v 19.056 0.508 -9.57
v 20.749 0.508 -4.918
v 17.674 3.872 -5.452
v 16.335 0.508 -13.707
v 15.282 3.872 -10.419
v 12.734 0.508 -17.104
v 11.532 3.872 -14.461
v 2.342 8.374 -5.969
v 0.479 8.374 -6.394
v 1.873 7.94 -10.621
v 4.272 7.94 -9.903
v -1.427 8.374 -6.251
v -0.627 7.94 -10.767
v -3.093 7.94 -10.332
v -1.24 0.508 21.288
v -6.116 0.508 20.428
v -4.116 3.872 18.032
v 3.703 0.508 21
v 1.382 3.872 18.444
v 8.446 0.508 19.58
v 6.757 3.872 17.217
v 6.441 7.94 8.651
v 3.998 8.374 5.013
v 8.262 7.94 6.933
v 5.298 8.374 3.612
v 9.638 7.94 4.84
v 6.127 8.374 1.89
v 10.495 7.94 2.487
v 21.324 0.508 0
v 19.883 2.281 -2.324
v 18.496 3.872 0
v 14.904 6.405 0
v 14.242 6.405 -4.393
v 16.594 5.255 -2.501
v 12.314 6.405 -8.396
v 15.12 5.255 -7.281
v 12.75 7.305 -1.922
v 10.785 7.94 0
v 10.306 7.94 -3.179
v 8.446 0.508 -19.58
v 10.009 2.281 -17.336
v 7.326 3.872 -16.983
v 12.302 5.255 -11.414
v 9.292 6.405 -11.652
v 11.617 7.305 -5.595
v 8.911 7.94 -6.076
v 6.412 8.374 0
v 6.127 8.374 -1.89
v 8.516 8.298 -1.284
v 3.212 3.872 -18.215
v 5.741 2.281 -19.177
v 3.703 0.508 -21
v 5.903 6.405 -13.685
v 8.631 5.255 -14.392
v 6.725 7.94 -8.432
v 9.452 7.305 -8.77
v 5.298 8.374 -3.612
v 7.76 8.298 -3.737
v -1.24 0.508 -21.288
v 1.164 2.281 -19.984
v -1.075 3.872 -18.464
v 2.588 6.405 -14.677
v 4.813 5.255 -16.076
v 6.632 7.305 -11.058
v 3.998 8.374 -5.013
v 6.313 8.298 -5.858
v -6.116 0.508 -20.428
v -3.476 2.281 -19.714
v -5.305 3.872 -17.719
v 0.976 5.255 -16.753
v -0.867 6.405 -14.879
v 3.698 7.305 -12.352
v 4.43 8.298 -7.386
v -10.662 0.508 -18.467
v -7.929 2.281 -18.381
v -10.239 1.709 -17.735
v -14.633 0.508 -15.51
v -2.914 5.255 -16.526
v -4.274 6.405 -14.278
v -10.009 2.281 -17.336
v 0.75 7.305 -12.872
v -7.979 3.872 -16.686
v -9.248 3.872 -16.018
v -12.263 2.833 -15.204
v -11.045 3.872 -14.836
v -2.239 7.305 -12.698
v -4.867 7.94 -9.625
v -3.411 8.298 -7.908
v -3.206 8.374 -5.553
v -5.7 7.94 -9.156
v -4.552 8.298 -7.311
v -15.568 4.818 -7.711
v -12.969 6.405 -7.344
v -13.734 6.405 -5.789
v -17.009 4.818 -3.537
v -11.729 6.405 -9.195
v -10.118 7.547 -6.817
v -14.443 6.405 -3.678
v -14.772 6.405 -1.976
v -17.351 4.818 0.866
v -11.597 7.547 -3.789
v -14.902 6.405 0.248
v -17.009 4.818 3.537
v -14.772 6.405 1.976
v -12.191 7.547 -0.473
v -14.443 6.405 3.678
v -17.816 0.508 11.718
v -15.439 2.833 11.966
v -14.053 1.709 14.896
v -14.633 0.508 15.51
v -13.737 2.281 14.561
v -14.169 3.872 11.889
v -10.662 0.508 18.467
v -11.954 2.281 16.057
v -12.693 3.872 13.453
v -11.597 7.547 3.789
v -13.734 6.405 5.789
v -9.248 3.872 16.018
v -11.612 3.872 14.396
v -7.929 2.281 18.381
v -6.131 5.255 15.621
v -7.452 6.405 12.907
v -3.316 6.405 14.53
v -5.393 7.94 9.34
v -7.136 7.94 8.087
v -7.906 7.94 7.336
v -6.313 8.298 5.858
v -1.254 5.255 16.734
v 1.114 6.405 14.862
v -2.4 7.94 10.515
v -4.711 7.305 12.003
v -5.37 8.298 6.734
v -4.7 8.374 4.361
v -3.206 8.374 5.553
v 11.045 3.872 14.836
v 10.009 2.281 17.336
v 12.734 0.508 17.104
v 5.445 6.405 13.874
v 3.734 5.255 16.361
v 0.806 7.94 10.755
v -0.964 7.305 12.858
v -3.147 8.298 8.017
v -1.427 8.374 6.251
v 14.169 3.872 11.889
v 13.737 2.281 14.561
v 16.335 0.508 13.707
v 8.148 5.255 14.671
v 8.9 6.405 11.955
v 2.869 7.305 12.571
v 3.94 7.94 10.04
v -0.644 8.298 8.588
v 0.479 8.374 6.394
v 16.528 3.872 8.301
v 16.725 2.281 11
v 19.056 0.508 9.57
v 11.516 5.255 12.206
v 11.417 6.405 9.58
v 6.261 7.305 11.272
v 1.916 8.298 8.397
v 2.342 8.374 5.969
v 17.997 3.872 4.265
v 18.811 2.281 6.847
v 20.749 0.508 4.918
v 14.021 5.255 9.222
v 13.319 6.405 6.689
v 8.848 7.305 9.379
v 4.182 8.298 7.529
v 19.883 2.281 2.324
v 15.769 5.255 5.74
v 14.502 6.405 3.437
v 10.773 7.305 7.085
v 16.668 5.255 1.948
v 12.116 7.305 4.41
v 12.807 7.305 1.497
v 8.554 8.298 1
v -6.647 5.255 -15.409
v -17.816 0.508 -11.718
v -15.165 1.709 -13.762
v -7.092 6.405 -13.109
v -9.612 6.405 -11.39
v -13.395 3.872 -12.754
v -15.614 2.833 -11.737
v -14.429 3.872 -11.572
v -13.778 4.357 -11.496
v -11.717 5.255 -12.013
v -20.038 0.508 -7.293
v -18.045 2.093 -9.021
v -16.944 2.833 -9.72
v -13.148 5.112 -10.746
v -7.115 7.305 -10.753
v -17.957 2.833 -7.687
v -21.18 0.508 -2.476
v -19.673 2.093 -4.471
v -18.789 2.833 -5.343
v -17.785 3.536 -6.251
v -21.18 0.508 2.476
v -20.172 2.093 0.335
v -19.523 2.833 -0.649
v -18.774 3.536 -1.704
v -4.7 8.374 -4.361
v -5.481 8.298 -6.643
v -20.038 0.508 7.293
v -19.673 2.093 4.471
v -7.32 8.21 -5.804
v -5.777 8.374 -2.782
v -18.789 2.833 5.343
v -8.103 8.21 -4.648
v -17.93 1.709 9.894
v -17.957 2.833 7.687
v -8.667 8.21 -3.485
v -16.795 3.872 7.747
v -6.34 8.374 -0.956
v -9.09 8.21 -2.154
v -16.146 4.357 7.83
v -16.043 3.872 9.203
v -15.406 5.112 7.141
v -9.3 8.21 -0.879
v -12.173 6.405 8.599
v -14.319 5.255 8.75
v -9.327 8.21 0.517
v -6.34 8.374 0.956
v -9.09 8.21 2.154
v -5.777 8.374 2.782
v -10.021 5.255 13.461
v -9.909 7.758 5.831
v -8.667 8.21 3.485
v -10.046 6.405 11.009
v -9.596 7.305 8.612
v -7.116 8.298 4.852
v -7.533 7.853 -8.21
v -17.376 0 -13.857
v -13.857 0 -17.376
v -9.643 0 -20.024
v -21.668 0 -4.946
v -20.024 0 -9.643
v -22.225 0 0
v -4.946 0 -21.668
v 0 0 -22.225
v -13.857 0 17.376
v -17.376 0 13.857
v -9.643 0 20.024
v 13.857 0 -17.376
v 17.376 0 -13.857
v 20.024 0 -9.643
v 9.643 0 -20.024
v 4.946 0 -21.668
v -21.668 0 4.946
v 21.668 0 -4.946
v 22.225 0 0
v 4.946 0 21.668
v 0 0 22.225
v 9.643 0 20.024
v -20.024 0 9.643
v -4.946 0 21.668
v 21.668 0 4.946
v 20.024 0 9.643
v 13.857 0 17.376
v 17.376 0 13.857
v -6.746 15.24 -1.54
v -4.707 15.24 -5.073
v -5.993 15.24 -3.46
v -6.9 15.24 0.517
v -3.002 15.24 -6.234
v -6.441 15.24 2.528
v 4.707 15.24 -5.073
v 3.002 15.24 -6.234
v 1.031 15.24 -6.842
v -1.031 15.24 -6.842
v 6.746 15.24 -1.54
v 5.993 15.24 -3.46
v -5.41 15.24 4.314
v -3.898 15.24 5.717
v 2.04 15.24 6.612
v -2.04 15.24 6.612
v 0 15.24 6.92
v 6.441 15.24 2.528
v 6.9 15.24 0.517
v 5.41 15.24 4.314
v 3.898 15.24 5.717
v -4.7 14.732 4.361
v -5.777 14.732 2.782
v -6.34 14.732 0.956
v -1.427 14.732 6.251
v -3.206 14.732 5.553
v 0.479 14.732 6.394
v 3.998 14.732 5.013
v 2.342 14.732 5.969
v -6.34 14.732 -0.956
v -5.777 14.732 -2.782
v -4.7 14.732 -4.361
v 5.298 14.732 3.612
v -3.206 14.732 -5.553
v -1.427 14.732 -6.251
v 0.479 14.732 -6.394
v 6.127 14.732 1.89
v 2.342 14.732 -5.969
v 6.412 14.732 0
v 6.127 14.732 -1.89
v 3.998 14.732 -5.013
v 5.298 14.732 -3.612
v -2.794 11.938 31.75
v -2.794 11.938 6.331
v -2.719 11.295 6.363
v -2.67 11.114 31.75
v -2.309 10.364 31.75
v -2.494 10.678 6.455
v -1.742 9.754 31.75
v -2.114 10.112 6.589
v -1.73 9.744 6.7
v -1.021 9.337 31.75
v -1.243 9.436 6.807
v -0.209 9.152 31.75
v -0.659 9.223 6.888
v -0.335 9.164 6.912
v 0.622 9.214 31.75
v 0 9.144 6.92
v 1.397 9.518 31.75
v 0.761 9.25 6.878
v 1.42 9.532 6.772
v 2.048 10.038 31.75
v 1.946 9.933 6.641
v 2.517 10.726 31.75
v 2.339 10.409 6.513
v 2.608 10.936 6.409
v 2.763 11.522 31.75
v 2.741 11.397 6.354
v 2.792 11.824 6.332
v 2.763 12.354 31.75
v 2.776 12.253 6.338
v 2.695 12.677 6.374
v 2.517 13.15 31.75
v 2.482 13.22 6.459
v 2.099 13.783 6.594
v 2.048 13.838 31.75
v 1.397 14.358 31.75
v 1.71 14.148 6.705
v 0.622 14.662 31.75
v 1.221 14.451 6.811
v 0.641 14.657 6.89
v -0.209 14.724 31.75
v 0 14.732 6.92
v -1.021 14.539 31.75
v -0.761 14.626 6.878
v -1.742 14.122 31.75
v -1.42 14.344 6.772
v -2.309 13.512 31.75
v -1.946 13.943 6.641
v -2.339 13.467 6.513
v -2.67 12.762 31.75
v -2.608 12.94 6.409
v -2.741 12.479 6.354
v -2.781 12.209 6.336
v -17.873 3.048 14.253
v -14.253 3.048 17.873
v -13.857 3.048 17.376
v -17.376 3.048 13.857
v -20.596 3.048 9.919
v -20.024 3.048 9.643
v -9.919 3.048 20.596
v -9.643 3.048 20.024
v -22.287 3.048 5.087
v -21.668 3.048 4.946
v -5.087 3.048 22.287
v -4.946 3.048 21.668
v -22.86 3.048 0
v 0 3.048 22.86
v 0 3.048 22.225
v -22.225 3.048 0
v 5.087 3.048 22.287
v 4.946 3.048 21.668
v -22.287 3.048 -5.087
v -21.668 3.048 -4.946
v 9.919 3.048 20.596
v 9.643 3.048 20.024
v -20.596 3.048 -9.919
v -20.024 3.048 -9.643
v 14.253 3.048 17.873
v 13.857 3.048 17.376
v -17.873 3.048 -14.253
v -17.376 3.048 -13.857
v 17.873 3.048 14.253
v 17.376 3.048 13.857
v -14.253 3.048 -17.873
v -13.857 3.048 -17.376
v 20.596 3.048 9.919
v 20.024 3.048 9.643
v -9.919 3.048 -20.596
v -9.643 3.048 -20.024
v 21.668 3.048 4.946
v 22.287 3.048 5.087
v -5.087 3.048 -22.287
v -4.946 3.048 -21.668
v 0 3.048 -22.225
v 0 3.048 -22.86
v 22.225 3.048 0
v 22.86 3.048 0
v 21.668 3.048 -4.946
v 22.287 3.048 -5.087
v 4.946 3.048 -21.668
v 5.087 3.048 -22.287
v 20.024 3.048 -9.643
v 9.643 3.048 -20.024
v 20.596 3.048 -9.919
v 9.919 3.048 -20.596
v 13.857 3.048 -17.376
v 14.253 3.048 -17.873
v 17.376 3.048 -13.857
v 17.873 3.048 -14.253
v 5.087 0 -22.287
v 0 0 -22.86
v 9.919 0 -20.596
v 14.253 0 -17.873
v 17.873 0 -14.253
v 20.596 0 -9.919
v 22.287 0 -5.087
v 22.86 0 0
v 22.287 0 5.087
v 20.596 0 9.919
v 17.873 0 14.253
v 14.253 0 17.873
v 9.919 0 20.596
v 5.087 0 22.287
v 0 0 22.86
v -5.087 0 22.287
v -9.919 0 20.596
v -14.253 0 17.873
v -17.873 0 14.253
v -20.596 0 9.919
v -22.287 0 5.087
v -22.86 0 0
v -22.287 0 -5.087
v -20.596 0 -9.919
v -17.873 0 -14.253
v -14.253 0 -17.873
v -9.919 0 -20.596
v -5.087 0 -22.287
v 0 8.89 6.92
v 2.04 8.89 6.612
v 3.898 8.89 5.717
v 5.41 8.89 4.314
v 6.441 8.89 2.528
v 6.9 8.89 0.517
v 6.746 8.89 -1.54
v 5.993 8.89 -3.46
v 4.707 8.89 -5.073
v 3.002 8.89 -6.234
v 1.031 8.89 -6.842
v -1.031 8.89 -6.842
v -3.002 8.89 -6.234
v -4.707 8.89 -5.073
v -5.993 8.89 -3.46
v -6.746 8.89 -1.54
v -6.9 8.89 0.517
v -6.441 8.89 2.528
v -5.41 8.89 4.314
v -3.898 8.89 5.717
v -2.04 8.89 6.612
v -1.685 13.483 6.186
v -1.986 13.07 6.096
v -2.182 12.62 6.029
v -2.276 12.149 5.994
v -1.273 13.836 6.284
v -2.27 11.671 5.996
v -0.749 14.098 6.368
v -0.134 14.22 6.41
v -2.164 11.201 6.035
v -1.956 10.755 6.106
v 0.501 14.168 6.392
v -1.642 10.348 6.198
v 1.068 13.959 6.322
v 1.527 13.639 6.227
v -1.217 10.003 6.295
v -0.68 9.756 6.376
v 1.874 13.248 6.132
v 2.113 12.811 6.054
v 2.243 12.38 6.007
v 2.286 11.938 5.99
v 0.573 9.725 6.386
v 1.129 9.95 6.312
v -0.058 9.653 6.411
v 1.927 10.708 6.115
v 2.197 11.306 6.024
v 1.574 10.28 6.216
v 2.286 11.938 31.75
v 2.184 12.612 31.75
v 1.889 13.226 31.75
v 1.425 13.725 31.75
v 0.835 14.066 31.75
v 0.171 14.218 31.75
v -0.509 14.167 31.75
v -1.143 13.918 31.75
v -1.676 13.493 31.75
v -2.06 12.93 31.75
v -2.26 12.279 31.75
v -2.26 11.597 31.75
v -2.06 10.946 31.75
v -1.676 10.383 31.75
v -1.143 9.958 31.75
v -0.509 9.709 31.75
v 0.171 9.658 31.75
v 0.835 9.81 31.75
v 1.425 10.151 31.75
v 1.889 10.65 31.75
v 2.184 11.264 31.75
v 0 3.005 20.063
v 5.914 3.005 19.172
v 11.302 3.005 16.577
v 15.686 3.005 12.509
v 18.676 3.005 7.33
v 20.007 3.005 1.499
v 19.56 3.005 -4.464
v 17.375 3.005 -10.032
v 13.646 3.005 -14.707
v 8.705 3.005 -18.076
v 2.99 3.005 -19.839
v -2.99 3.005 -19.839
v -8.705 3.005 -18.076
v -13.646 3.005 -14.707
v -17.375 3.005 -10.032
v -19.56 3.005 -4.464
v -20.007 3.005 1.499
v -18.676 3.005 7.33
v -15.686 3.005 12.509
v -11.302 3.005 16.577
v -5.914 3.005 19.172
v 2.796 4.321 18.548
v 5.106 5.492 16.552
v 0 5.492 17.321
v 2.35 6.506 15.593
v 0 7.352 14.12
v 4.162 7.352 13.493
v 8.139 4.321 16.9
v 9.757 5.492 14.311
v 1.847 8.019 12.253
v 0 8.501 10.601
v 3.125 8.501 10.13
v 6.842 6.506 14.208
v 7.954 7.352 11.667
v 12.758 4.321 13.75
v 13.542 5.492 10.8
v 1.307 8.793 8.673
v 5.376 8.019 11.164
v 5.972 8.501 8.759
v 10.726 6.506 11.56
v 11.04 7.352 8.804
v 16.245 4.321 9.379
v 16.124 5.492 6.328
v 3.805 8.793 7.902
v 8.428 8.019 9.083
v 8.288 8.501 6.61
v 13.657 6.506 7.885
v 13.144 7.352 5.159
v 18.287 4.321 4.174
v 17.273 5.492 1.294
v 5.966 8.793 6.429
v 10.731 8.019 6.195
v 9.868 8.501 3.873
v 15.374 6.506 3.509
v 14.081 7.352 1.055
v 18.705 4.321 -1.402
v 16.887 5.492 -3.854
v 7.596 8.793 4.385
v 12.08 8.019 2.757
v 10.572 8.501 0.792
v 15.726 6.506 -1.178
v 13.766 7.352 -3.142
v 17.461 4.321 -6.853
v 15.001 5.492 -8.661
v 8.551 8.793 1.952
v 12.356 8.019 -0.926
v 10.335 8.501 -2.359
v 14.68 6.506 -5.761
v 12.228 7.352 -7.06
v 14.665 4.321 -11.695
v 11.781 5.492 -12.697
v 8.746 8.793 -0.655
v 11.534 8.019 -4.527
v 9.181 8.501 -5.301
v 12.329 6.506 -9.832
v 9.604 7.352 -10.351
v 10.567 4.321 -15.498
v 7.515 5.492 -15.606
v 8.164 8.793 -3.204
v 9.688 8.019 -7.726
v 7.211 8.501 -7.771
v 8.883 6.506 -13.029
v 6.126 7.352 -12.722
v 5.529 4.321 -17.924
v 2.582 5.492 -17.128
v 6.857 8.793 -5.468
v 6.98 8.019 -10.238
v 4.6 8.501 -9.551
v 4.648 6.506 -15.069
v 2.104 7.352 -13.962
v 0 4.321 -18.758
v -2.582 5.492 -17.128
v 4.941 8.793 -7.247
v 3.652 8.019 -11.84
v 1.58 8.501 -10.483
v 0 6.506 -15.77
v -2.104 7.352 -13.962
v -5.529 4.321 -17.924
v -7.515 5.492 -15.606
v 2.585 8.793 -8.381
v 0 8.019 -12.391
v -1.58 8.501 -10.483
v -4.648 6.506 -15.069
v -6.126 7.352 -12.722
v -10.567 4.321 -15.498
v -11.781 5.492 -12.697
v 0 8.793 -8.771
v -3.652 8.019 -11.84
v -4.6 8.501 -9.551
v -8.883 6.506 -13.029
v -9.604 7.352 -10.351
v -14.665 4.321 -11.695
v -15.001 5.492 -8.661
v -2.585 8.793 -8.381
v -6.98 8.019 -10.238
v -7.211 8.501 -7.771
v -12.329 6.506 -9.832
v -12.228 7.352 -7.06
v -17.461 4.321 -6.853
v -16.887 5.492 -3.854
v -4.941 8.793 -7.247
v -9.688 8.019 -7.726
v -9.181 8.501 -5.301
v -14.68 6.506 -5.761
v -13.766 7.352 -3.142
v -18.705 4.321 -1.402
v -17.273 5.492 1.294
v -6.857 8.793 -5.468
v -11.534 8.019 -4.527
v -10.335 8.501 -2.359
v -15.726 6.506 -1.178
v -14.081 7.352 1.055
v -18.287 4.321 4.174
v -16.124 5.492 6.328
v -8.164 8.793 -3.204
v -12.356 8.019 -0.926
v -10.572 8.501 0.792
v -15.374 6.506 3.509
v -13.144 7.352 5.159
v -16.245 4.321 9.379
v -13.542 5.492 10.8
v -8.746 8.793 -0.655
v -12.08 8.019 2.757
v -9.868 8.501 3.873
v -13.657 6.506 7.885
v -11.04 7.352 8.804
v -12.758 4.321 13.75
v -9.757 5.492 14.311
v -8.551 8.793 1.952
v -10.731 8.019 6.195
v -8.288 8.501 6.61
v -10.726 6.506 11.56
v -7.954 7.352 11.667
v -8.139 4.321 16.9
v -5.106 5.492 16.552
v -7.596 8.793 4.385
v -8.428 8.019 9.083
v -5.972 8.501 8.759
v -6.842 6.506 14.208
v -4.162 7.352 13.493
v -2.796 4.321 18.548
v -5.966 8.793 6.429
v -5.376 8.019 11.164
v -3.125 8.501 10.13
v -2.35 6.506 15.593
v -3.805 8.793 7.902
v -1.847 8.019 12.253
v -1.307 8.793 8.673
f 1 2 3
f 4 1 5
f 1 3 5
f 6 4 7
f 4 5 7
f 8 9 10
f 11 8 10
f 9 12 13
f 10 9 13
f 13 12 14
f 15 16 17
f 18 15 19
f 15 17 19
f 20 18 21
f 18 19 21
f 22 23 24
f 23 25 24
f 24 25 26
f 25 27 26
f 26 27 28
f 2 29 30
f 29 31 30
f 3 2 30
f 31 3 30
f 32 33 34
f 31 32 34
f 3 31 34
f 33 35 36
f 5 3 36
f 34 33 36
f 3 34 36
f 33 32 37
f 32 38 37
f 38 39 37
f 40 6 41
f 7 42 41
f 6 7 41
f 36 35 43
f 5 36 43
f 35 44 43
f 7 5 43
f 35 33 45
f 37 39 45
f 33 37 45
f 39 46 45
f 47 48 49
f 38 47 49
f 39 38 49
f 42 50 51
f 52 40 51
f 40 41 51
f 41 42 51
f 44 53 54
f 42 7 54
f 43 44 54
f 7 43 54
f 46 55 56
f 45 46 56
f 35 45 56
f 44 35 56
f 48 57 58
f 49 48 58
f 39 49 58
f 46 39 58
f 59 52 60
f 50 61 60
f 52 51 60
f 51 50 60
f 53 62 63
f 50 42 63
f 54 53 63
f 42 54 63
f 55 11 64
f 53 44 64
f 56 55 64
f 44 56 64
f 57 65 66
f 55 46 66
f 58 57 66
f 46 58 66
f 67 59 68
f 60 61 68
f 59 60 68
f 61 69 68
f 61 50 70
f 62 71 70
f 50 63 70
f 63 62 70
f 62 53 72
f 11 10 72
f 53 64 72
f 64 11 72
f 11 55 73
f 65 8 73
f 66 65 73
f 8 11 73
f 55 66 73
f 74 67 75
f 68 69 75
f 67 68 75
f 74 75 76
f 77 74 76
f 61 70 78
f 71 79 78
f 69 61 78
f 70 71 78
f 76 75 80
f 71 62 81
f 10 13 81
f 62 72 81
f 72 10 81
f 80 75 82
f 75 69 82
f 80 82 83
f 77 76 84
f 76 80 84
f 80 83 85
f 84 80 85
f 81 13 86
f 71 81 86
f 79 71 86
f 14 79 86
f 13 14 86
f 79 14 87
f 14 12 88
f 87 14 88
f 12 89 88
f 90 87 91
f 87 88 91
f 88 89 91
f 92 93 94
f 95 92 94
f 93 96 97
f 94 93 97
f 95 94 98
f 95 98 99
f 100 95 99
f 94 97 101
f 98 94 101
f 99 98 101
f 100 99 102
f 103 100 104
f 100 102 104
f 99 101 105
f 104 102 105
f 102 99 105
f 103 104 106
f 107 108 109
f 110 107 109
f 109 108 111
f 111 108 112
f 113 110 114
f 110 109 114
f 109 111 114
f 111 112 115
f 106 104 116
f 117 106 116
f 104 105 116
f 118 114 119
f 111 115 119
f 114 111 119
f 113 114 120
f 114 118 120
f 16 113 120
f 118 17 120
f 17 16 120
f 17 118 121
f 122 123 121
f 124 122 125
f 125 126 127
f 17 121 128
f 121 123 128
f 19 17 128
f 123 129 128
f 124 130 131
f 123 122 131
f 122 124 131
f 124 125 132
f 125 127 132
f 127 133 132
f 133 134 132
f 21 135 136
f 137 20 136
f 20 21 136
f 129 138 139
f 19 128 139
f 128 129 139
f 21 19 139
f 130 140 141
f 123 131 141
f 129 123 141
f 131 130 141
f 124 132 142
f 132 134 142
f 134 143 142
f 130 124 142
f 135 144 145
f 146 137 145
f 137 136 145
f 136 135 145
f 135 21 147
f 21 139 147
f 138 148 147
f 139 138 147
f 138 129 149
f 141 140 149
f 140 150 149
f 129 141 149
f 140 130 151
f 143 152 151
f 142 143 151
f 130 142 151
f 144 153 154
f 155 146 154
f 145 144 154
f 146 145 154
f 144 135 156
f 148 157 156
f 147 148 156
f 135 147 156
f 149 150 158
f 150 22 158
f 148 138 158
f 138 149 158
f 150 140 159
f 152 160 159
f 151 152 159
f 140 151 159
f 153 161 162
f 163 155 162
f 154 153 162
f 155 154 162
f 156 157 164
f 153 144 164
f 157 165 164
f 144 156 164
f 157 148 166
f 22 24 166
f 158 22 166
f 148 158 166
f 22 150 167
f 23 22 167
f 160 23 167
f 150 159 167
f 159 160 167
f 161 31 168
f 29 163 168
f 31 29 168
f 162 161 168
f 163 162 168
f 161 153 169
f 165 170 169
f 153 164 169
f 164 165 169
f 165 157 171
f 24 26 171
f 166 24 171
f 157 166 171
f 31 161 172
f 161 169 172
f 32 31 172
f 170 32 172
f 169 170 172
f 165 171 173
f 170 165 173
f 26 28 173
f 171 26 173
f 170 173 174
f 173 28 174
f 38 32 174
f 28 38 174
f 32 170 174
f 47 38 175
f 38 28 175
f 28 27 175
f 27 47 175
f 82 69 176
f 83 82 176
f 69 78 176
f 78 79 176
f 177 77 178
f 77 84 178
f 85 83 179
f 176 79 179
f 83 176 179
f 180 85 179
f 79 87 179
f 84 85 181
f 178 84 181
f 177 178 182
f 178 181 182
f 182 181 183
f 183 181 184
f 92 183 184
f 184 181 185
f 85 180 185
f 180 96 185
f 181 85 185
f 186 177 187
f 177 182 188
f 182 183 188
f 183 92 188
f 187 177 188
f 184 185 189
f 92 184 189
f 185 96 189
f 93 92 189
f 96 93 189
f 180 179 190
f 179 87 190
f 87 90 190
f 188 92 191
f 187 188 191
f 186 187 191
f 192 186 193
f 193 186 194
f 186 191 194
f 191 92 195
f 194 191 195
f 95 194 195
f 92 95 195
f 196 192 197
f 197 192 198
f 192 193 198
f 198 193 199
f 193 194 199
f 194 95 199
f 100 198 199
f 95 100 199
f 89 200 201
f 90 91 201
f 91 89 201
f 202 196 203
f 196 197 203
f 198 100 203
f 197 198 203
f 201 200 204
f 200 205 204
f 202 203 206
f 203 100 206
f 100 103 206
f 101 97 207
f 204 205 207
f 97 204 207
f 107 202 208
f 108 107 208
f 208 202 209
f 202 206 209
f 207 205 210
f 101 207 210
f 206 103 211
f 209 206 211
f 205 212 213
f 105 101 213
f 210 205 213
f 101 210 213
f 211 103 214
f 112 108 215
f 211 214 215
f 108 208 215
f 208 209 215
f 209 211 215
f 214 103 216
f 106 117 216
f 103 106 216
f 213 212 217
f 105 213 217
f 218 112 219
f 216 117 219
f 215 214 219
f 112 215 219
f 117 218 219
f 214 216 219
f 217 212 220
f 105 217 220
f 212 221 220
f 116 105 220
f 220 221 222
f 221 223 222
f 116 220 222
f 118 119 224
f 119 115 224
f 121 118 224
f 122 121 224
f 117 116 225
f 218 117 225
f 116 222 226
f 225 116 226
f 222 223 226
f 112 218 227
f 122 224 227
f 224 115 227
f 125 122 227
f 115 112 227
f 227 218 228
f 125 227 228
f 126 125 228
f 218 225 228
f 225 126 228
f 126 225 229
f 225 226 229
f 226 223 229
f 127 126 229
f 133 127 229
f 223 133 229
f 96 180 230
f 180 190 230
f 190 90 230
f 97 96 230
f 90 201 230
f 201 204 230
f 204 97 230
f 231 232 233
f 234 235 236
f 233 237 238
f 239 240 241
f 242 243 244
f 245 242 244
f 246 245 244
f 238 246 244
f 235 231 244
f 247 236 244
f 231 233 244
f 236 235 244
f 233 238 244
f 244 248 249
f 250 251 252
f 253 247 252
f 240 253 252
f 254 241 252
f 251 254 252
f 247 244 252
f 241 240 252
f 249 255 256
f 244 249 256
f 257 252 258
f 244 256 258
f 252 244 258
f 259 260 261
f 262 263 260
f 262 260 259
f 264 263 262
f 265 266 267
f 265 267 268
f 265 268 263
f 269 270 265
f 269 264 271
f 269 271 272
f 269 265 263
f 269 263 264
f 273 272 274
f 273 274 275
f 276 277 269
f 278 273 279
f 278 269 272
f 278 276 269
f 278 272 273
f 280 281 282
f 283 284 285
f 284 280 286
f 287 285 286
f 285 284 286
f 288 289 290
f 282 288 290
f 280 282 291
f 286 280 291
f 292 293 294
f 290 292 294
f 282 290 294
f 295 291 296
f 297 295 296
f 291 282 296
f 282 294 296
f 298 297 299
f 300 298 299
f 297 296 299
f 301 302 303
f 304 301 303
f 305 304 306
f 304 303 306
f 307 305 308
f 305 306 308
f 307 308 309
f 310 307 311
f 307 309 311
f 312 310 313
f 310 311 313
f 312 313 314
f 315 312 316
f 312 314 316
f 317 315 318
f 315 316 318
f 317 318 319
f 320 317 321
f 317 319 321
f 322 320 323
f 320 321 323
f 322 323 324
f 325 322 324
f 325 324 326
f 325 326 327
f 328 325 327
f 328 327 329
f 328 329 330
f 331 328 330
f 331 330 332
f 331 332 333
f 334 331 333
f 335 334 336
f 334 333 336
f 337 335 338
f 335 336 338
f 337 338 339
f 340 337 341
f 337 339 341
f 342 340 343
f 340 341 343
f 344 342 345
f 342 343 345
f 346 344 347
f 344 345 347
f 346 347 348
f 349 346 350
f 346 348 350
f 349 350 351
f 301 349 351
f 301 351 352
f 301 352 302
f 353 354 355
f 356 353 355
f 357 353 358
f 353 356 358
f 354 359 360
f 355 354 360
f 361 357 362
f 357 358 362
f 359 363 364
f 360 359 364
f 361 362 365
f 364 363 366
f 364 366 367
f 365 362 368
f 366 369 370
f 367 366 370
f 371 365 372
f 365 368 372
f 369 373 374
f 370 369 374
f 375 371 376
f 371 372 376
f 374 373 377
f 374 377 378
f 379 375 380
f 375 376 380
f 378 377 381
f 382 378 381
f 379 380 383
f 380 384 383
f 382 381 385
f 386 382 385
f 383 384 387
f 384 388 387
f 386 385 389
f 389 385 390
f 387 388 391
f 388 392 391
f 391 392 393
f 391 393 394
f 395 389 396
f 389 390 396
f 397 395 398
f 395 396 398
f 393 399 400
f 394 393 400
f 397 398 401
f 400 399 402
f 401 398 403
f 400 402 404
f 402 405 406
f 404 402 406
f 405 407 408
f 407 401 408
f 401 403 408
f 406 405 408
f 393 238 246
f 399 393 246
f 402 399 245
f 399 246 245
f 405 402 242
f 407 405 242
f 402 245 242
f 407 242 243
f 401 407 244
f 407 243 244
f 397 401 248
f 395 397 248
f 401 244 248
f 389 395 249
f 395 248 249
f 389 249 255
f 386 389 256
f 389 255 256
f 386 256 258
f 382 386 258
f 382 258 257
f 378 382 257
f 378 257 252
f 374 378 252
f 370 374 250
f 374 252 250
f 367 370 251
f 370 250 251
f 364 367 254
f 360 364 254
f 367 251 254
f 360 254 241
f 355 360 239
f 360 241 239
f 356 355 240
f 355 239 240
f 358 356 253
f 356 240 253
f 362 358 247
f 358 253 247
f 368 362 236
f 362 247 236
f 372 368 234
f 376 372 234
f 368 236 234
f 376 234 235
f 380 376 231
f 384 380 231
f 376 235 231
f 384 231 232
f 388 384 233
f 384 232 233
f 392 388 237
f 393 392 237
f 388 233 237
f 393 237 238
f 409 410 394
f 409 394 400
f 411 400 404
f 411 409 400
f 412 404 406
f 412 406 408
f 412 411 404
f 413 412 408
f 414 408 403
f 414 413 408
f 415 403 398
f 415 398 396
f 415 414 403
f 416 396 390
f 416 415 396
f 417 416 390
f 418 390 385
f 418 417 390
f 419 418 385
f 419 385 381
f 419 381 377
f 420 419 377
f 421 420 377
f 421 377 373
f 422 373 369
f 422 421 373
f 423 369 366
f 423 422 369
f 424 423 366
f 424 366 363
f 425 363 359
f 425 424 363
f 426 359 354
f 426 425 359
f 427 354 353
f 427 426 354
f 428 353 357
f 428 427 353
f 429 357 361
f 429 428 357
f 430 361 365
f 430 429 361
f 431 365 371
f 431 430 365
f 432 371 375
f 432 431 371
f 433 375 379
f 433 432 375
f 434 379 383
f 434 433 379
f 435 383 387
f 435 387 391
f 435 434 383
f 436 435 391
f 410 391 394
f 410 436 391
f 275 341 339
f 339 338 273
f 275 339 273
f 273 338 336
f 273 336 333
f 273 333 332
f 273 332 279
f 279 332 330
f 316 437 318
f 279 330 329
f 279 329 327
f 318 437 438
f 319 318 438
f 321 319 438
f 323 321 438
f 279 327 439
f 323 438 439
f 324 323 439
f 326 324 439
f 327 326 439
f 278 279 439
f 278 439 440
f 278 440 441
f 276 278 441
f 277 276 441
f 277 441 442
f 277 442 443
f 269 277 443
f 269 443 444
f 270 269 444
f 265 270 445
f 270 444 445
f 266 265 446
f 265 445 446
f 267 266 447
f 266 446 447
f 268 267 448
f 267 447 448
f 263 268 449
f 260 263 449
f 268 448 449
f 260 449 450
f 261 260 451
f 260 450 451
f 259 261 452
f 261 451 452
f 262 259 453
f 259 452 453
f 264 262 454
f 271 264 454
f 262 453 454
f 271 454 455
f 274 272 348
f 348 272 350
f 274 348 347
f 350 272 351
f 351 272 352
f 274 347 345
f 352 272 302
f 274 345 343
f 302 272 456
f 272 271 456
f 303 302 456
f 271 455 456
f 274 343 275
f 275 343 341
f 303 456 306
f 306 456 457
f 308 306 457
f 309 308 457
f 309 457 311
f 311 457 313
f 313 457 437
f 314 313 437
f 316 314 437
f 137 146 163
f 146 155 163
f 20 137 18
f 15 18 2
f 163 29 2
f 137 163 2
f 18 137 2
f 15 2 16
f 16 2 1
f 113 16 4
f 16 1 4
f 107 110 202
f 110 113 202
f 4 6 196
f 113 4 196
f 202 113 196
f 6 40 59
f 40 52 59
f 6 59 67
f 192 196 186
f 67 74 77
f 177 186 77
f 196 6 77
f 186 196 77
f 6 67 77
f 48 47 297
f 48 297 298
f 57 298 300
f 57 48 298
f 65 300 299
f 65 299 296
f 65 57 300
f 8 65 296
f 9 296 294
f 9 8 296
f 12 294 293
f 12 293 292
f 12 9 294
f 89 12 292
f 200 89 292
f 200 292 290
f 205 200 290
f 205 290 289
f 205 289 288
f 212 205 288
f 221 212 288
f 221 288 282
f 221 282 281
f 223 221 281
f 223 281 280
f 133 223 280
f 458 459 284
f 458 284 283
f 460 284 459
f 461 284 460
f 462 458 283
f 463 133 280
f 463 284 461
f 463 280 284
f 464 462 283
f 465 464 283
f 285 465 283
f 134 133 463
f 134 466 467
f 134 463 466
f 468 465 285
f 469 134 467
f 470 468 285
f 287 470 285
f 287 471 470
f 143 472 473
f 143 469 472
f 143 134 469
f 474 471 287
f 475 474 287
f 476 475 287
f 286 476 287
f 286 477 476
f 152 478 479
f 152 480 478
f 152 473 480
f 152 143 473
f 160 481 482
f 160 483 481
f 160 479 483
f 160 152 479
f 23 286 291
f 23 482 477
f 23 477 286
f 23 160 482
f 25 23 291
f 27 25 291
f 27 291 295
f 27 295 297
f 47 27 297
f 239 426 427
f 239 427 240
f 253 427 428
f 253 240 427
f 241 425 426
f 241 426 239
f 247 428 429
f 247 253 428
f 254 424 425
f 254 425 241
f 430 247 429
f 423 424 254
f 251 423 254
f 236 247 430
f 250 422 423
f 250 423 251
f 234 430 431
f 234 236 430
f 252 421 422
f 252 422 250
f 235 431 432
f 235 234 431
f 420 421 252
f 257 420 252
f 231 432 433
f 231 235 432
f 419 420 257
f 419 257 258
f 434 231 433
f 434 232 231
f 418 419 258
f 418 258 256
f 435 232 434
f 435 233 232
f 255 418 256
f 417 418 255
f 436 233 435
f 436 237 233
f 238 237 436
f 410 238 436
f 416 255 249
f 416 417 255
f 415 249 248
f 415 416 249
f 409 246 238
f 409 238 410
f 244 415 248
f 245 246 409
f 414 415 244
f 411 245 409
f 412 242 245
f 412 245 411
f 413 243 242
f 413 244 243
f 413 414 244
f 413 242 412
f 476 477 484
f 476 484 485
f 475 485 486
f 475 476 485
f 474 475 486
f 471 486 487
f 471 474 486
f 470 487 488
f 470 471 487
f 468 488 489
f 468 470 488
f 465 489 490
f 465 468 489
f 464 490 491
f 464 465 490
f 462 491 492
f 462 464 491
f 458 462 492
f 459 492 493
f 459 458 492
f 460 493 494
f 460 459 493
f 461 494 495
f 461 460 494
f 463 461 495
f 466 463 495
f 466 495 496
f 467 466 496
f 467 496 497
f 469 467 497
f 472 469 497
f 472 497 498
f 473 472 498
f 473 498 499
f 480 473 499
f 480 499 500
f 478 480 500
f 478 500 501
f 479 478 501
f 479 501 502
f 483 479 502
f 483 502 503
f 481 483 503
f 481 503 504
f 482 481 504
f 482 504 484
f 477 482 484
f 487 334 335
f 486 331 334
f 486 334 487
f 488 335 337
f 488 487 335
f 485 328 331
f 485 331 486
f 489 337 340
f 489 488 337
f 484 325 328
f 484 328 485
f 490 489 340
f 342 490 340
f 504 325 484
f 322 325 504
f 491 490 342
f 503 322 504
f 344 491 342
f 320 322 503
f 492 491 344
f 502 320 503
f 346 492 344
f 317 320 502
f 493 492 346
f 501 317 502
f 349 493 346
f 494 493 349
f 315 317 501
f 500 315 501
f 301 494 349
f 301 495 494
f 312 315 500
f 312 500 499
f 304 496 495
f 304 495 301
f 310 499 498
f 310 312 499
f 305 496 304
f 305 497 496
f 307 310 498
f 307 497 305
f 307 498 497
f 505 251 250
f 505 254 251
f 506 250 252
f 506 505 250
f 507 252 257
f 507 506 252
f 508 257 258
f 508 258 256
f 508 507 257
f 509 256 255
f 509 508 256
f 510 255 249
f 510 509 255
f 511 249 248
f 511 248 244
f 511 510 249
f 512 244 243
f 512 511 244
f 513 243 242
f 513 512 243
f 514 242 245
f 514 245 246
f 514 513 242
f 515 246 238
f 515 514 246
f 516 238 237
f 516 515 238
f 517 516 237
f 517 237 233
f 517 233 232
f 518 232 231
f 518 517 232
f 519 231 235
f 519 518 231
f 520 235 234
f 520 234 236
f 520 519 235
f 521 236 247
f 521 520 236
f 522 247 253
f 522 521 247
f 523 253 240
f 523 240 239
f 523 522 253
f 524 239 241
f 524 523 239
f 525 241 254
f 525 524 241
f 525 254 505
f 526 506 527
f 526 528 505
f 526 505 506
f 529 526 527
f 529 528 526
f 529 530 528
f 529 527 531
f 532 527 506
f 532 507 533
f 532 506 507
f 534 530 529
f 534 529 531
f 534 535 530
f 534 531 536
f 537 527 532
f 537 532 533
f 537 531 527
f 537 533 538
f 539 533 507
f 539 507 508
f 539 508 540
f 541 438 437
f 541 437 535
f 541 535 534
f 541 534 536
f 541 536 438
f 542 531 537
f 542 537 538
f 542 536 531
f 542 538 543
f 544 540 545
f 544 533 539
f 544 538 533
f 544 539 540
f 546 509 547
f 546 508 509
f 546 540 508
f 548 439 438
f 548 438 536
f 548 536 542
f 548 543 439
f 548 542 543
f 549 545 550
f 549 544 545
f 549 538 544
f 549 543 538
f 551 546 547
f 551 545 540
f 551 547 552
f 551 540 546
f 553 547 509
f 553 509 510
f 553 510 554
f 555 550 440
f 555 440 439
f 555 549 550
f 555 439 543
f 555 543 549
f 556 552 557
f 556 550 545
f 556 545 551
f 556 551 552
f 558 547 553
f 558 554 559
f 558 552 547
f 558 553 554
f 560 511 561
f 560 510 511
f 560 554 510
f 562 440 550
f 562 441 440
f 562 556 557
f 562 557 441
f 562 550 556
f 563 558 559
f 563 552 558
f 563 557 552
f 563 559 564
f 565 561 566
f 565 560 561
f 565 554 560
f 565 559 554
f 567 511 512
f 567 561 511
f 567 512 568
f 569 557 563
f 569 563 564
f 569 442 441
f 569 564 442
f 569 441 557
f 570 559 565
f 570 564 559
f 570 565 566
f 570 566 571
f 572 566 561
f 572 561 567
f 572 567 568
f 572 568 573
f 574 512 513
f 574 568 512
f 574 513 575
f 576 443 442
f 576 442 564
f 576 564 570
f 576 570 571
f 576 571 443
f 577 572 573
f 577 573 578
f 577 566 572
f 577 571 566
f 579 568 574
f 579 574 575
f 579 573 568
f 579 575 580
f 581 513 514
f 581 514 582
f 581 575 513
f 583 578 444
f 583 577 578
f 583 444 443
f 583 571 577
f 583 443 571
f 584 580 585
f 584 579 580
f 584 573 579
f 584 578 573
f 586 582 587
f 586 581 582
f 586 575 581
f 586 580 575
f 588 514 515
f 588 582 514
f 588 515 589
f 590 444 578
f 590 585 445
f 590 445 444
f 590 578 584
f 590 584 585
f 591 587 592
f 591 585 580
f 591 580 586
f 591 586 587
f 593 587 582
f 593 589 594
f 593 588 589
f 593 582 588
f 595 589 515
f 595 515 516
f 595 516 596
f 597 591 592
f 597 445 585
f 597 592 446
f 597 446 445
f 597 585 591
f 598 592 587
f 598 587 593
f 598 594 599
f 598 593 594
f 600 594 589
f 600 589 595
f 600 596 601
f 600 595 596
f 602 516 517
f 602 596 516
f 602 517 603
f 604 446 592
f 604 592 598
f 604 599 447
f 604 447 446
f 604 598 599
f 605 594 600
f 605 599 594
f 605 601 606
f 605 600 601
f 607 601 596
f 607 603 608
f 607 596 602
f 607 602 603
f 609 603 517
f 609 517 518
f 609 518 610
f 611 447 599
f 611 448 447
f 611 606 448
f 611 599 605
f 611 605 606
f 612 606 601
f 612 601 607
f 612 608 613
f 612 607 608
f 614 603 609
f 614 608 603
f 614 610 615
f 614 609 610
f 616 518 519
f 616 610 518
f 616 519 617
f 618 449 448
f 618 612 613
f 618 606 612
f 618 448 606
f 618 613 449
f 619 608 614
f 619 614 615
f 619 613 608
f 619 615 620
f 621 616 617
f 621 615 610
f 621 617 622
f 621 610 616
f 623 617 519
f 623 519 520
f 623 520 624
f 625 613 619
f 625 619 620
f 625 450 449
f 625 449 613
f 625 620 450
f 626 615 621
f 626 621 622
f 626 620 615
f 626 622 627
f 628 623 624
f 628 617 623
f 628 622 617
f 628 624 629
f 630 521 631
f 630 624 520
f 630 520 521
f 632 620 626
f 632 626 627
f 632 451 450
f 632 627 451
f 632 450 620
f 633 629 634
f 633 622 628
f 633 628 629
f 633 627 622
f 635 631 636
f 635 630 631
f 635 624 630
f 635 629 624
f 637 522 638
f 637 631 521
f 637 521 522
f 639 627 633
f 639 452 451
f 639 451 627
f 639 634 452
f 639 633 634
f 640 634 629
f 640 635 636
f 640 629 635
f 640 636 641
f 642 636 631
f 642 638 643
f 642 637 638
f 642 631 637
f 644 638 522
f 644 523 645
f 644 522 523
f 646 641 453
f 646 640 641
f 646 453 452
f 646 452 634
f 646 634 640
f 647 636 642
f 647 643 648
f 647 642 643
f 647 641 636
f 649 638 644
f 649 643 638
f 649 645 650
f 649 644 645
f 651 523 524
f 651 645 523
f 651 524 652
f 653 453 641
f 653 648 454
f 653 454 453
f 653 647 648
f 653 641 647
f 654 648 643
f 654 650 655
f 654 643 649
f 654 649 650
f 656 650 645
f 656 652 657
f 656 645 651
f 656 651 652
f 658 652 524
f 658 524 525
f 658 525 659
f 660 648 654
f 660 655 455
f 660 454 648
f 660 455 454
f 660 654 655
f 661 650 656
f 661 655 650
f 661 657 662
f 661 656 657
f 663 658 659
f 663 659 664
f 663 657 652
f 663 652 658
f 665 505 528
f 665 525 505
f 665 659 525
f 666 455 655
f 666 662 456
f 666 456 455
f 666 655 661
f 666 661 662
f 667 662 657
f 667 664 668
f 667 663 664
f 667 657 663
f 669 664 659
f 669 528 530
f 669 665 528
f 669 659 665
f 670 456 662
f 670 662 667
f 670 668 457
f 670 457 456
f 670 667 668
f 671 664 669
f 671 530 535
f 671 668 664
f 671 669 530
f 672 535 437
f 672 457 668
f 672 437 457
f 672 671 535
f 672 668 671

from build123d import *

# Parameters (mm, degrees)
SKETCH1_R           = 22.225
BOSS_EXTRUDE2_DEPTH = 8.89
FILLET1_R           = 17.62
SKETCH4_R           = 22.86
SKETCH4_R_2         = 22.225
BOSS_EXTRUDE4_DEPTH = 3.048
SKETCH6_R           = 6.919723132
BOSS_EXTRUDE5_DEPTH = 6.35
SKETCH7_R           = 2.794
BOSS_EXTRUDE6_DEPTH = 31.75
SHELL1_START        = 0.508
SHELL1_OUTLINE_R    = 6.411723132
SHELL1_DEPTH        = 14.224
SHELL1_START_2      = 5.990358975
SHELL1_2_OUTLINE_R  = 2.286
SHELL1_2_DEPTH      = 25.759641025


with BuildPart() as part:
    # Sketch1 → Boss-Extrude2 (new body)
    with BuildSketch(Plane(origin=(0, 0, 0), x_dir=(1, 0, 0), z_dir=(0, 1, 0))):
        with Locations(Location((0, 0, 0), (0, 0, 270))):
            Circle(SKETCH1_R)
    extrude(amount=BOSS_EXTRUDE2_DEPTH)

    # Fillet1
    # the kernel refuses this fillet: 17.62 mm, written as the material it takes off along each edge
    with BuildSketch(Plane(origin=(0, 8.89, 0), x_dir=(0, 0, 1), z_dir=(-1, 0, 0))) as fillet1_piece_1:
        with BuildLine():
            CenterArc((6.919723132, -17.62), FILLET1_R, 29.700068365, 60.299931635)
            Line((6.919723132, 0), (6.919723132, 0.3524))
            Line((6.919723132, 0.3524), (22.225, 0.3524))
            Line((22.225, 0.3524), (22.5774, 0))
            ThreePointArc((22.5774, 0), (22.5774, -4.445), (22.531105537, -8.7154))
            Line((22.531105537, -8.7154), (22.225, -8.89))
        make_face()
    revolve(axis=Axis((0, 8.89, 0), (0, 1, 0)), mode=Mode.SUBTRACT)

    # Sketch6 → Boss-Extrude5 (add)
    with BuildSketch(Plane(origin=(0, 8.89, 0), x_dir=(1, 0, 0), z_dir=(0, 1, 0))):
        with Locations(Location((0, 0, 0), (0, 0, 270))):
            Circle(SKETCH6_R)
    extrude(amount=BOSS_EXTRUDE5_DEPTH)

    # Sketch7 → Boss-Extrude6 (add)
    with BuildSketch(Plane.XY):
        with Locations(Location((0, 11.938, 0), (0, 0, 180))):
            Circle(SKETCH7_R)
    extrude(amount=BOSS_EXTRUDE6_DEPTH)

    # Shell1: read off the stored shape, not the designer's step
    # Shell1 outline → Shell1 (cut)
    with BuildSketch(Plane(origin=(0, 0, 0), x_dir=(1, 0, 0), z_dir=(0, 1, 0)).offset(SHELL1_START)):
        Circle(SHELL1_OUTLINE_R)
    extrude(amount=SHELL1_DEPTH, mode=Mode.SUBTRACT)

    # Shell1 2 outline → Shell1 2 (cut)
    with BuildSketch(Plane.XY.offset(SHELL1_START_2)):
        with Locations((0, 11.938)):
            Circle(SHELL1_2_OUTLINE_R)
    extrude(amount=SHELL1_2_DEPTH, mode=Mode.SUBTRACT)

    # Shell1 3 outline → Shell1 3 (revolve, cut)
    with BuildSketch(Plane.XY):
        with BuildLine():
            Line((6.411723132, 8.374457898), (6.411723132, 0.508))
            Line((6.411723132, 0.508), (21.323885725, 0.508))
            ThreePointArc((21.323885725, 0.508), (14.903840095, 6.405204668), (6.411723132, 8.374457898))
        make_face()
    revolve(axis=Axis((0, 0, 0), (0, 1, 0)), mode=Mode.SUBTRACT)


with BuildPart() as body_2:
    # Sketch4 → Boss-Extrude4 (new body)
    with BuildSketch(Plane(origin=(0, 0, 0), x_dir=(-1, 0, 0), z_dir=(0, -1, 0))):
        with Locations(Location((0, 0, 0), (0, 0, 90))):
            Circle(SKETCH4_R)
        with Locations(Location((0, 0, 0), (0, 0, 90))):
            Circle(SKETCH4_R_2, mode=Mode.SUBTRACT)
    extrude(amount=-BOSS_EXTRUDE4_DEPTH)


solid = Compound([part.part, body_2.part])
